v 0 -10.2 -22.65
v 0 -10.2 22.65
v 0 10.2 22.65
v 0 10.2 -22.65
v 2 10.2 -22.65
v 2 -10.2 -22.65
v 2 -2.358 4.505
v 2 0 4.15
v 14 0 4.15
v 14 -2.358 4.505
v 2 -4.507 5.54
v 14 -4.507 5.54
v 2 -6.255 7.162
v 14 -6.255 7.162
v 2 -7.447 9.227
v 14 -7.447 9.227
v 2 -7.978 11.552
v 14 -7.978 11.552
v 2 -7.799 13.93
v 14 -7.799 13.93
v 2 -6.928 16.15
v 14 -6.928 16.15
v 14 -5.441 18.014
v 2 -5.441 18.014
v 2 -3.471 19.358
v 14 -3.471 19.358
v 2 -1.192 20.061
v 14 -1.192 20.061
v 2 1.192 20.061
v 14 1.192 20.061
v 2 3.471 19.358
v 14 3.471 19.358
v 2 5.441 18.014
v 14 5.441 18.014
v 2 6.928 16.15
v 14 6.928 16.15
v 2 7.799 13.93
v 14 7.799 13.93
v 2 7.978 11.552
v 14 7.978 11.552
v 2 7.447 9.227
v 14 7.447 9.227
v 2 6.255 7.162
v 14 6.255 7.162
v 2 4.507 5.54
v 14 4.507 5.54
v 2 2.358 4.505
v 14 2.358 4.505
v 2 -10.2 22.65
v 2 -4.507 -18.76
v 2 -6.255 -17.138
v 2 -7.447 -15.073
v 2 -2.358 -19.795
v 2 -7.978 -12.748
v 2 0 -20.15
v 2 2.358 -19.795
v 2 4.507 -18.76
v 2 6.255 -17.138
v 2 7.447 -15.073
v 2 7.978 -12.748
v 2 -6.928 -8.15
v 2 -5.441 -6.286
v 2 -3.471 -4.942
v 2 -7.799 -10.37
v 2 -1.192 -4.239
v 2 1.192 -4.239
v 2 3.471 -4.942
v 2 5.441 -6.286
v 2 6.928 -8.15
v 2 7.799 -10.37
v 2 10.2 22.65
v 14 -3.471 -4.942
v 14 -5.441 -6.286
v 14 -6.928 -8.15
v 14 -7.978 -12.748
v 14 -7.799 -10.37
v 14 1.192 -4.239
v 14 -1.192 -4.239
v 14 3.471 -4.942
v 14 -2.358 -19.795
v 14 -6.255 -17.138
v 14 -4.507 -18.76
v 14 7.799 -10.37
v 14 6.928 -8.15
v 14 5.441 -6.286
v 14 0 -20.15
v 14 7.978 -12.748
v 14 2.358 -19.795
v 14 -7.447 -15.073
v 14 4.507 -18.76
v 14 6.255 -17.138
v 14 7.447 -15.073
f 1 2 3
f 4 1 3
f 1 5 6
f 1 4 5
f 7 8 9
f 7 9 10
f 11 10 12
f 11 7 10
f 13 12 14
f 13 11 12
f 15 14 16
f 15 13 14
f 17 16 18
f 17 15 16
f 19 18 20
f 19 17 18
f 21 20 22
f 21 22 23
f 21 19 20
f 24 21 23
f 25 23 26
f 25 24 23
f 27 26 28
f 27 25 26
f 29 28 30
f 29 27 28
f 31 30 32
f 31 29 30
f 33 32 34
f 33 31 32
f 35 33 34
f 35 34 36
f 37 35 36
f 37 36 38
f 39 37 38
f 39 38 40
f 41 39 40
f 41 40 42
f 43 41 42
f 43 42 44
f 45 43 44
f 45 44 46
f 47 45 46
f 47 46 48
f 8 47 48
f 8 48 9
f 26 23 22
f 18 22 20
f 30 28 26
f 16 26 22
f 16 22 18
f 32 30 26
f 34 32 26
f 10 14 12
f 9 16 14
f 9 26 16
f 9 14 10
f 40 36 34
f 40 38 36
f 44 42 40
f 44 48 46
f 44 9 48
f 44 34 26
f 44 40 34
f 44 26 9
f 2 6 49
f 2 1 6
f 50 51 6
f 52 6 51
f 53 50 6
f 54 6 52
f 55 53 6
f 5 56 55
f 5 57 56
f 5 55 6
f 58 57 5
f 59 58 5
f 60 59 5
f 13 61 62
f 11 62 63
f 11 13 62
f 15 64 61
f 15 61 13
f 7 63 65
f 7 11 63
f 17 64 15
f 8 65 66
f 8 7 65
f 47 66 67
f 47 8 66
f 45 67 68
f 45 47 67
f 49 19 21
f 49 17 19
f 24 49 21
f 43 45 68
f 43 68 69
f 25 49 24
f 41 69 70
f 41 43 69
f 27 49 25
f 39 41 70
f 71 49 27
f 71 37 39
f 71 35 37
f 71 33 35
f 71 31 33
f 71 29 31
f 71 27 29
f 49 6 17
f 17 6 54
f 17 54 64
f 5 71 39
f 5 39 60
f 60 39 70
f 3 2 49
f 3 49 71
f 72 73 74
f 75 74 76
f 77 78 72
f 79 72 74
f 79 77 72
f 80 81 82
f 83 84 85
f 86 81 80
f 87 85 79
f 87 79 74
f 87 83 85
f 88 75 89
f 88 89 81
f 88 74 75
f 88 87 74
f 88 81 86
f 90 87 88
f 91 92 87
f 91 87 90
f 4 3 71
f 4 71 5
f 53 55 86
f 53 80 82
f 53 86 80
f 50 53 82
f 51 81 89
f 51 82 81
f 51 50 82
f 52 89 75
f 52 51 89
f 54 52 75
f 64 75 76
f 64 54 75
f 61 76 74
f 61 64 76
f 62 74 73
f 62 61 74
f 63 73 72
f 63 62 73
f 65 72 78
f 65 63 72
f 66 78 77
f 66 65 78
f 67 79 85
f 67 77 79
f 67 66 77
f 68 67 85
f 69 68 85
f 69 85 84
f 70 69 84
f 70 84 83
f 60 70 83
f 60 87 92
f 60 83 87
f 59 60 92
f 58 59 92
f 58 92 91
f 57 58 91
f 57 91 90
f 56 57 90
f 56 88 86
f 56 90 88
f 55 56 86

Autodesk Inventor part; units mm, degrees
ref_plane "YZ Plane" through (0, 0, 0) normal (1, 0, 0) x (0, 1, 0)
ref_plane "XZ Plane" through (0, 0, 0) normal (0, 1, 0) x (-1, 0, 0)
ref_plane "XY Plane" through (0, 0, 0) normal (0, 0, 1) x (1, 0, 0)
sketch "Sketch1" plane through (0, 0, 0) normal (1, 0, 0) x (0, 1, 0)
  line L0 (-20.4, 45.3) -> (20.4, 45.3)
  line L1 (20.4, 45.3) -> (20.4, -45.3)
  line L2 (20.4, -45.3) -> (-20.4, -45.3)
  line L3 (-20.4, -45.3) -> (-20.4, 45.3)
  line L4 (-20.4, 45.3) -> (20.4, -45.3) construction
  line L5 (20.4, 45.3) -> (-20.4, -45.3) construction
  point P0 (0, 0)
  dimension "d0" = 40.8
  dimension "d1" = 90.6
extrude "Extrusion1" add sketch "Sketch1" along normal blind 4
sketch "Sketch2" plane through (4, 0, 0) normal (1, 0, 0) x (0, 0, -1)
  circle A0 centre (-24.3, 0) radius 16
  line L0 (-45.3, 20.4) -> (-45.3, -20.4) projected
  line L1 (-45.3, 0) -> (-40.3, 0)
  line L2 (-45.3, 0) -> (-41.0258, 0)
  line L3 (45.3, 20.4) -> (-45.3, 20.4) projected
  line L4 (-45.3, -20.4) -> (45.3, -20.4) projected
  circle A1 centre (24.3, 0) radius 16
  dimension "d4" = 32
extrude "Extrusion2" add sketch "Sketch2" along normal blind 24
sketch "Sketch3" plane through (4, 0, 0) normal (1, 0, 0) x (0, 0, -1)
  line L0 (-45.3, 20.4) -> (-45.3, -20.4) projected
  line L1 (-45.3, -20.4) -> (45.3, -20.4) projected
  line L2 (-45.3, 20.4) -> (45.3, -20.4)
  line L3 (45.3, -20.4) -> (45.3, 20.4) projected
  line L4 (-45.3, -20.4) -> (45.3, 20.4)
  circle A0 centre (0, 0) radius 5
  line L5 (0, 0) -> (0, -27.8597)
  dimension "d9" = 10
sketch "Sketch4" plane through (0, 0, 0) normal (-1, 0, 0) x (0, 0, 1)
  line L0 (-45.3, -20.4) -> (-45.3, 20.4) projected
  line L1 (45.3, 20.4) -> (45.3, -20.4) projected
  line L2 (-45.3, 20.4) -> (45.3, 20.4)
  line L3 (45.3, 20.4) -> (45.3, -20.4)
  line L4 (45.3, -20.4) -> (-45.3, -20.4)
  line L5 (-45.3, -20.4) -> (-45.3, 20.4)
  point P0 (0, 0)
scale "Scale1" factors (0.5, 0.5, 0.5) then translate (0, 0, 0) bodies 1
properties part number "Ultrasound" material "PET Plastic"
